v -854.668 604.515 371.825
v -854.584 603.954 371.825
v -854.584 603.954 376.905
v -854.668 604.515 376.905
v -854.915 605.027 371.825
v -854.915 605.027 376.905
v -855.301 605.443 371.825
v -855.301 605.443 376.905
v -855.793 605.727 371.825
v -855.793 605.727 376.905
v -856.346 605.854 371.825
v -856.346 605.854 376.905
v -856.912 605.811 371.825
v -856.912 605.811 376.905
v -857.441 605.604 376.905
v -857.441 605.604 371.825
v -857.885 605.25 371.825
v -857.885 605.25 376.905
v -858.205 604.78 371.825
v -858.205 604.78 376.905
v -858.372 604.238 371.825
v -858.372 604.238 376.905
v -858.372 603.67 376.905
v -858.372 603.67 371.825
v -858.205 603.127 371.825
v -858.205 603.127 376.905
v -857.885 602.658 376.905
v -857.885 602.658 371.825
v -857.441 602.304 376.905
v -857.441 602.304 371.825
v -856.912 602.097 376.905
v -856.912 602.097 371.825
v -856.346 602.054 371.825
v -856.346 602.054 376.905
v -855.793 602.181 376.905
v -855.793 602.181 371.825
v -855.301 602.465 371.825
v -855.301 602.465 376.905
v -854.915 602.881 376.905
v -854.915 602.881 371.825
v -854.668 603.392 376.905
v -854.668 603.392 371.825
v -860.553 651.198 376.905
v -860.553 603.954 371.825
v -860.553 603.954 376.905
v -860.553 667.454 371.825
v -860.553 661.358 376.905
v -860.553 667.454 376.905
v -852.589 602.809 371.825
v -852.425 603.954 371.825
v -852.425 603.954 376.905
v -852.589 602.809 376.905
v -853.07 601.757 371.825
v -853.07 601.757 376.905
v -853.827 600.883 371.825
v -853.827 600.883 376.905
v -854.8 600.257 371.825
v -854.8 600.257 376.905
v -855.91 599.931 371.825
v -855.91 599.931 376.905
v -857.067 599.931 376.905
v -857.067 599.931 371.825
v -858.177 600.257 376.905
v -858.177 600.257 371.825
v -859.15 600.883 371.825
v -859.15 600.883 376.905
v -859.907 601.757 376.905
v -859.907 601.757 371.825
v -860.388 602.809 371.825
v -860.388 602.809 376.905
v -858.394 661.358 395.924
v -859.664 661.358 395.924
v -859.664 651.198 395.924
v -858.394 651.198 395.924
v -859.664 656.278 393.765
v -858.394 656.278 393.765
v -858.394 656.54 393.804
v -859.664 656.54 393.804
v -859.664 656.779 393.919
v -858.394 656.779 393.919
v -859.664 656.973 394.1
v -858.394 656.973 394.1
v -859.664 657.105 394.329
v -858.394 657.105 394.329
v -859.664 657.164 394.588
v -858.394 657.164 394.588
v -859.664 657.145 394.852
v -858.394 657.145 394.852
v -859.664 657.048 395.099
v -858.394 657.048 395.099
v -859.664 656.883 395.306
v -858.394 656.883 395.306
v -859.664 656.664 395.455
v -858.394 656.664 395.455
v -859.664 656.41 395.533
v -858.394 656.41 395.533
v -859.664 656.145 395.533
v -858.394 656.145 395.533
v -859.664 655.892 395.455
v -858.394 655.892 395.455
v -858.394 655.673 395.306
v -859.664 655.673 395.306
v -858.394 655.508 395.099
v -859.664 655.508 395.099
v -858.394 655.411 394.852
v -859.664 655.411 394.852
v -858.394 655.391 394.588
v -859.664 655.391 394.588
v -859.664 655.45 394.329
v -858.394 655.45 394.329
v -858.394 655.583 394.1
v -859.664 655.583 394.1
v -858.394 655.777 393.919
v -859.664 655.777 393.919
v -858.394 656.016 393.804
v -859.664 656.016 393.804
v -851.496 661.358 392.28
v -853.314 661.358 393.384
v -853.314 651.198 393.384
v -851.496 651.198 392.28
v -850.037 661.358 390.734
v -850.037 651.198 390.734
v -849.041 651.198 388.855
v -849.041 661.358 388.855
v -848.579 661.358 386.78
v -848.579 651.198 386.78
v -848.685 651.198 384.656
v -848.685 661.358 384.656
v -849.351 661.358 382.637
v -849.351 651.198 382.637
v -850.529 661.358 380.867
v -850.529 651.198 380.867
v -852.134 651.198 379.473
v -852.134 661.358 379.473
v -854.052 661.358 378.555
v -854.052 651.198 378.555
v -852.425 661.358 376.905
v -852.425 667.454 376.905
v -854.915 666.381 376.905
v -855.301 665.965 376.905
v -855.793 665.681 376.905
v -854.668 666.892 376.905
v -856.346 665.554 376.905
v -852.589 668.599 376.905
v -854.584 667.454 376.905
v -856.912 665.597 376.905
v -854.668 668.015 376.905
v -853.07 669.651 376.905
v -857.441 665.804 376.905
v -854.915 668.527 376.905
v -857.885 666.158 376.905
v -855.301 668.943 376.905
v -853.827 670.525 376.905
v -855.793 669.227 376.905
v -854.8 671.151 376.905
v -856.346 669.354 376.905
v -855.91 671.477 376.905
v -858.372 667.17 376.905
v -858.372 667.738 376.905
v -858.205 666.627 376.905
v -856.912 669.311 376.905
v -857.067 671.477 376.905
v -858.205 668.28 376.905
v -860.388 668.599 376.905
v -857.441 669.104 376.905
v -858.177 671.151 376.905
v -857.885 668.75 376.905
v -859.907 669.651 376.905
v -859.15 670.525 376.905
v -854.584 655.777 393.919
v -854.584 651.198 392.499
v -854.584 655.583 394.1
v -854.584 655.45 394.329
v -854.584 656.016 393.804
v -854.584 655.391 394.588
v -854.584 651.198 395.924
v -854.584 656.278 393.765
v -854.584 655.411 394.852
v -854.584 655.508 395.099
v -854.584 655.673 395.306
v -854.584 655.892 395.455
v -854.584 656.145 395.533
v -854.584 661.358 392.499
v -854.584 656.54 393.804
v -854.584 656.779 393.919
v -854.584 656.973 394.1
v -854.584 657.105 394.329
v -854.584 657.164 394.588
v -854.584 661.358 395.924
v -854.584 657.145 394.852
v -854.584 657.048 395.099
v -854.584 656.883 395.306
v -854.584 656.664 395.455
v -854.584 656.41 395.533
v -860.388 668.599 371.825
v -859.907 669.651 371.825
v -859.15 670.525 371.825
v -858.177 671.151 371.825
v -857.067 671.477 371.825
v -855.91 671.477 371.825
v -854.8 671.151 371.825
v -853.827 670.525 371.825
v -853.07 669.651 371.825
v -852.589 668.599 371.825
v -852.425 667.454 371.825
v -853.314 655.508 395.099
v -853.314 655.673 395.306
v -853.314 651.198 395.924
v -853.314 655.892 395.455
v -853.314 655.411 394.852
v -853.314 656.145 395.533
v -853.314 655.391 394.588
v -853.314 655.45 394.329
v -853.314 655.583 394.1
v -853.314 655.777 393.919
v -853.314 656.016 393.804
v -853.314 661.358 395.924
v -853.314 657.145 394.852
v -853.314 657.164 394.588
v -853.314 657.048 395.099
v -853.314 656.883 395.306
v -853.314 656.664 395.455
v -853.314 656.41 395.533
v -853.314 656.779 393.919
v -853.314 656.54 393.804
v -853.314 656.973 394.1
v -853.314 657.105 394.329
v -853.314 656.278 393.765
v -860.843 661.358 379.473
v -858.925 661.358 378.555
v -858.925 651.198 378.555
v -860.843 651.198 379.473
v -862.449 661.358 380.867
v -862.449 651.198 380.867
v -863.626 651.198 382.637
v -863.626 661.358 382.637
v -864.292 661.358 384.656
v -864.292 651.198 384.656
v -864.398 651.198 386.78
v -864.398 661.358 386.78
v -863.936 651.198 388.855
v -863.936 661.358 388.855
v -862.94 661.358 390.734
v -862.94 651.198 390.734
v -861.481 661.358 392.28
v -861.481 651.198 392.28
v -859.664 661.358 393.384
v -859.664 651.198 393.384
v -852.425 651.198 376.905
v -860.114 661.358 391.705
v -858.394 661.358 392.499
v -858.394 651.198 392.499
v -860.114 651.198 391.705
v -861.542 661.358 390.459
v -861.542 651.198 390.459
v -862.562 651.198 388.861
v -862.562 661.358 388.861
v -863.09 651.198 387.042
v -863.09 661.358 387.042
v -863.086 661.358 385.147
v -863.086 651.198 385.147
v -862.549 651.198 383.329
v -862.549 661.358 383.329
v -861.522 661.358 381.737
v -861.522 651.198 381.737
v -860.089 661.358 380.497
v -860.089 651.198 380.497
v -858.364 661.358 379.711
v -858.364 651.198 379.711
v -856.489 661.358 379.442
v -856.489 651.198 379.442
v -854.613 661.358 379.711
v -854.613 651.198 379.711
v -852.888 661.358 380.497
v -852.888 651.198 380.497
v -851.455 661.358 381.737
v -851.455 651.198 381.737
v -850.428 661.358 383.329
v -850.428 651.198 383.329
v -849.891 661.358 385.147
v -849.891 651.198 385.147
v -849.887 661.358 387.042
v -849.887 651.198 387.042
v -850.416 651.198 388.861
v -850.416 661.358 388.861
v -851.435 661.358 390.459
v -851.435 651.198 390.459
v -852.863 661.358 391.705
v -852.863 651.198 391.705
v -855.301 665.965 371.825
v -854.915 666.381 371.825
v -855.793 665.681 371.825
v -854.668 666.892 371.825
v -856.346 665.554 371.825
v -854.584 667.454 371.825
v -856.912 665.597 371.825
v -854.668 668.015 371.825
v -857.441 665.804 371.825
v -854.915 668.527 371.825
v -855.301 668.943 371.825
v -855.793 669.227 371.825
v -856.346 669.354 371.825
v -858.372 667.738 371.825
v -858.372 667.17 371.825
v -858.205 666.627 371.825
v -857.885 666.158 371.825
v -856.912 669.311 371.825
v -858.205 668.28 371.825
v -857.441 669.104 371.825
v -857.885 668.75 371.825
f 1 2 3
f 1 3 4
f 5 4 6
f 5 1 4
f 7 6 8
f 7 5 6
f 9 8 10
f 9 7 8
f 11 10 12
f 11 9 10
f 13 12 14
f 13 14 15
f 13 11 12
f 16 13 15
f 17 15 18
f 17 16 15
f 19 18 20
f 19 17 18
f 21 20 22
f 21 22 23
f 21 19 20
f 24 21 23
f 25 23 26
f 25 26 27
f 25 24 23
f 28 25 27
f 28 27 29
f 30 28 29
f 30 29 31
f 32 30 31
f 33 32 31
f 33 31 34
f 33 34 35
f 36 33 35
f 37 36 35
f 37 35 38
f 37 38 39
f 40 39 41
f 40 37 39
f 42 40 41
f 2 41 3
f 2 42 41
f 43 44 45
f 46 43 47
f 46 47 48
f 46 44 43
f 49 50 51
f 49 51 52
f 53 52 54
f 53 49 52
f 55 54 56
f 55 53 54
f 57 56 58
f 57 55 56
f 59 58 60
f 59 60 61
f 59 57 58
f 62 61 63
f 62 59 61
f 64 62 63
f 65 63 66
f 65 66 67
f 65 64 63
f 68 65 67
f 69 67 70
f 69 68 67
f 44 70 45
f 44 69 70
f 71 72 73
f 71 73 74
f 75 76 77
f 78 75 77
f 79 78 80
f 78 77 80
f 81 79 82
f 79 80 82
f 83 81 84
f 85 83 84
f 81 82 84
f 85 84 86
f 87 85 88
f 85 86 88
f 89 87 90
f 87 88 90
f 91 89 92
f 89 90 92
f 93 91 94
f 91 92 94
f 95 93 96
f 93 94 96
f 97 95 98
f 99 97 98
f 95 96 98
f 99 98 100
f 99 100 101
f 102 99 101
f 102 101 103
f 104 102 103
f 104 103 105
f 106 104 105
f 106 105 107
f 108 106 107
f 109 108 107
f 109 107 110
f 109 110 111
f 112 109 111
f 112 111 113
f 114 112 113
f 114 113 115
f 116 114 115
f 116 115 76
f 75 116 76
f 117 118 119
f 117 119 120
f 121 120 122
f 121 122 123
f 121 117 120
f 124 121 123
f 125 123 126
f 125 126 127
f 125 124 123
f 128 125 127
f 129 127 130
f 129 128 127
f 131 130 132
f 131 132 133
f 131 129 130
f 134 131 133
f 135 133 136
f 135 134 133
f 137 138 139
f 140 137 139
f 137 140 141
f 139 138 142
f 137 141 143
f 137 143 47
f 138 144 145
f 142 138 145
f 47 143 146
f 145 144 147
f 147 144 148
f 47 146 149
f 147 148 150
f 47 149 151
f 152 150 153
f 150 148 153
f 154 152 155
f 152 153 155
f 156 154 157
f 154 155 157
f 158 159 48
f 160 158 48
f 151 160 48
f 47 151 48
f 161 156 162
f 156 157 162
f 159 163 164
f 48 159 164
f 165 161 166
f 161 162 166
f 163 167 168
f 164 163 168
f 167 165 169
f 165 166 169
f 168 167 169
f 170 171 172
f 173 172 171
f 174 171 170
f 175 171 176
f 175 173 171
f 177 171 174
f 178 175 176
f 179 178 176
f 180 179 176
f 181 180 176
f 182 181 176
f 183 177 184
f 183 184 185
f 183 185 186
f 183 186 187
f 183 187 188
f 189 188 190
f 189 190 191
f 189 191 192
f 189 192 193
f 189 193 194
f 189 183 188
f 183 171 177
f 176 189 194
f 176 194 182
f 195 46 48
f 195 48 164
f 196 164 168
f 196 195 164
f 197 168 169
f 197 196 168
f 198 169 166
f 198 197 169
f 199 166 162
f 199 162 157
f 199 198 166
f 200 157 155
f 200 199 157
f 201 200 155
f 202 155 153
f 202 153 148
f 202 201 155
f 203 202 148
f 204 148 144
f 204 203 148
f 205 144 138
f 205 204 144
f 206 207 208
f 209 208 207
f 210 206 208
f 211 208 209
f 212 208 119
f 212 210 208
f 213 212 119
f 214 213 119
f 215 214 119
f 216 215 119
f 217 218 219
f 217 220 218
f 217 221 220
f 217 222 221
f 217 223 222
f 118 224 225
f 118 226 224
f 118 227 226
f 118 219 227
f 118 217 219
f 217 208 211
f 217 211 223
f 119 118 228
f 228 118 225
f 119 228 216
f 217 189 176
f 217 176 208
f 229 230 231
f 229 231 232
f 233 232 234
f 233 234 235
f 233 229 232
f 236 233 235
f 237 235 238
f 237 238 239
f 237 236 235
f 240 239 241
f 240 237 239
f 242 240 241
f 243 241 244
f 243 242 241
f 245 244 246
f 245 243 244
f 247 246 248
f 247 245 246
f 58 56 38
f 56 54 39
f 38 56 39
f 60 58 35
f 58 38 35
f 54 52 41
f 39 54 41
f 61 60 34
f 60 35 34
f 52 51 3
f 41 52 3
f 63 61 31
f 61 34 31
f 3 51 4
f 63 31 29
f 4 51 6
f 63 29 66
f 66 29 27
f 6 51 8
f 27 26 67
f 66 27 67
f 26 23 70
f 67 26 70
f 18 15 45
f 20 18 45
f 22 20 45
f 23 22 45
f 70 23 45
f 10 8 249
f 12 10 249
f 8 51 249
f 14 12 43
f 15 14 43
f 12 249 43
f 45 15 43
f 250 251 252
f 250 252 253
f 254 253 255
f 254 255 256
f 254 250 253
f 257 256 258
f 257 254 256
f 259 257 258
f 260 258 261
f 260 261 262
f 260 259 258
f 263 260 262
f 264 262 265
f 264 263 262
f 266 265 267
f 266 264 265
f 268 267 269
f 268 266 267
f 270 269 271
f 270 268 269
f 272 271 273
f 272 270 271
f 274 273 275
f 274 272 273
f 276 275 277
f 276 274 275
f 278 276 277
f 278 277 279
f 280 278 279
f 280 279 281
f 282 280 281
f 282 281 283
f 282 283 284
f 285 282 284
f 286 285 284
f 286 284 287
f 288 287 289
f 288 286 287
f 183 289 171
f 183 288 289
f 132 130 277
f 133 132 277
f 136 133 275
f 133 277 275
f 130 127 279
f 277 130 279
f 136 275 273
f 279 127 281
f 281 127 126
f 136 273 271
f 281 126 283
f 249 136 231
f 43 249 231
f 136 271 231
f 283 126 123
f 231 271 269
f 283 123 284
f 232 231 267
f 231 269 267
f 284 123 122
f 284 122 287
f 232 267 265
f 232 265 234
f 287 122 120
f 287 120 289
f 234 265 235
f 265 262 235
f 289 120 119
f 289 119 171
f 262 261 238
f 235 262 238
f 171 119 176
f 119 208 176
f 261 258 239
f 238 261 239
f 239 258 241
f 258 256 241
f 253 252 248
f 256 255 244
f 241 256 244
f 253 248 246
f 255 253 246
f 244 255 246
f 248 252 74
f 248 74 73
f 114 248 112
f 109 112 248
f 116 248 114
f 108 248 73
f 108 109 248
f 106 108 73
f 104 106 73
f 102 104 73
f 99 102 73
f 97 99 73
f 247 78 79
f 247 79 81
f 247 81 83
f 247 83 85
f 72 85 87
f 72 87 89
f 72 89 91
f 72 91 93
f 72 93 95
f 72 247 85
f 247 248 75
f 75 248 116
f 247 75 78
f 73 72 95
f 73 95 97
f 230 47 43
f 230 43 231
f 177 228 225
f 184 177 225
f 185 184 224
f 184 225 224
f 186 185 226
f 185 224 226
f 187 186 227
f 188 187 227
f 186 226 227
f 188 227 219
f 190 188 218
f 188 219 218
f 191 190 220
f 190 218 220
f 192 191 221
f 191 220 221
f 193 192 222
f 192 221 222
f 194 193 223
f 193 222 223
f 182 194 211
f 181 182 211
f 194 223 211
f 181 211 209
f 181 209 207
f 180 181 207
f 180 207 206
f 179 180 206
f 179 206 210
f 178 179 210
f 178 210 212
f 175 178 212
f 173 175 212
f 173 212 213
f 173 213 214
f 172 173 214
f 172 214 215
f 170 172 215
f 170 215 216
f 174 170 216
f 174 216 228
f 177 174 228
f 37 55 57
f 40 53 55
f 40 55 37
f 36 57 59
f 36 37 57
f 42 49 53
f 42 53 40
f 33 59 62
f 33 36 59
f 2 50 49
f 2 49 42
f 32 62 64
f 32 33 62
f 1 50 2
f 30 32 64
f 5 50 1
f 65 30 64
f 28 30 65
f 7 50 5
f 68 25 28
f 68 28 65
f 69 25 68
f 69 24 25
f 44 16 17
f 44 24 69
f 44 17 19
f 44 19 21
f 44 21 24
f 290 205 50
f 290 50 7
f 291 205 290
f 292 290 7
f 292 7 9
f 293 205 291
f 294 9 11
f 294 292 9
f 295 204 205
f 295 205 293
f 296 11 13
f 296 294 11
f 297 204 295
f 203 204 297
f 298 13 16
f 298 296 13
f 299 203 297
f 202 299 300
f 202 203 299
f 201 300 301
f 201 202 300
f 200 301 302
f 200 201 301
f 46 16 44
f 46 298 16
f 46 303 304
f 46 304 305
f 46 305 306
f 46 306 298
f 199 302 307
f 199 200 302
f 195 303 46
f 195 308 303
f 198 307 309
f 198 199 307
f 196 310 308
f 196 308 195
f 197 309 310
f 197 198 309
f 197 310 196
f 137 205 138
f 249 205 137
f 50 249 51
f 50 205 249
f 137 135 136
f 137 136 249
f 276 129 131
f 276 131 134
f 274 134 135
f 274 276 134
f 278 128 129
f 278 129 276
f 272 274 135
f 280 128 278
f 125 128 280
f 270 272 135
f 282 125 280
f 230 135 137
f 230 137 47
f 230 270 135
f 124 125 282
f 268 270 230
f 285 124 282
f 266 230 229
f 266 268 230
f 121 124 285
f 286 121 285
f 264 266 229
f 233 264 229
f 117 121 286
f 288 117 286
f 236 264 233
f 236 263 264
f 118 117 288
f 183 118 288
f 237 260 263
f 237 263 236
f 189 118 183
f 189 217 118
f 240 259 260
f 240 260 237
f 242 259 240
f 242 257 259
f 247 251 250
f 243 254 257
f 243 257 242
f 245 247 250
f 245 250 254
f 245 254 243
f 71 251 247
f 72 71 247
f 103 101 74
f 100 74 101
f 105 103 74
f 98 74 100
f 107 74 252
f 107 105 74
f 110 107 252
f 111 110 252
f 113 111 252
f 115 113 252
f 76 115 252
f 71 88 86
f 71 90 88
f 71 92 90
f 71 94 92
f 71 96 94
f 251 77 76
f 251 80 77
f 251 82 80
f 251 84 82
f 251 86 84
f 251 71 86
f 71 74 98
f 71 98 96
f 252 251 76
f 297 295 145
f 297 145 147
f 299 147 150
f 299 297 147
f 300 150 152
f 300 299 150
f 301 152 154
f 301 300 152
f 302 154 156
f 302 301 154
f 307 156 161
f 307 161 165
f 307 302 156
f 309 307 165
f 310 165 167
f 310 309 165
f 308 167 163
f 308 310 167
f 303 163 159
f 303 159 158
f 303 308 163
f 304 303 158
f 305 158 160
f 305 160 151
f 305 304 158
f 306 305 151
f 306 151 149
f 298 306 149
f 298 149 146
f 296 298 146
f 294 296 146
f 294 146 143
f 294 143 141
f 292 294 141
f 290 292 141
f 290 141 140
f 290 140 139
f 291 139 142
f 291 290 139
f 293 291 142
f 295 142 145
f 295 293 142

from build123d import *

# Parameters (mm, degrees)
SKETCH1_R           = 1.905
BOSS_EXTRUDE1_DEPTH = 5.08
BOSS_EXTRUDE2_START = 10.16
BOSS_EXTRUDE2_DEPTH = 10.16
SKETCH3_R           = 0.889
CUT_EXTRUDE1_DEPTH  = 12.1125


with BuildPart() as part:
    # Sketch1 → Boss-Extrude1 (new body)
    with BuildSketch(Plane(origin=(-856.488519717, 635.703940982, 371.824950285), x_dir=(1, 0, 0), z_dir=(0, 0, 1))):
        with BuildLine():
            Line((4.064, 31.75), (4.064, -31.75))
            ThreePointArc((4.064, -31.75), (0, -35.814), (-4.064, -31.75))
            Line((-4.064, -31.75), (-4.064, 31.75))
            ThreePointArc((-4.064, 31.75), (0, 35.814), (4.064, 31.75))
        make_face()
        with Locations((0, -31.75)):
            Circle(SKETCH1_R, mode=Mode.SUBTRACT)
        with Locations((0, 31.75)):
            Circle(SKETCH1_R, mode=Mode.SUBTRACT)
    extrude(amount=BOSS_EXTRUDE1_DEPTH)

    # Sketch2 → Boss-Extrude2 (add)
    with BuildSketch(Plane.XZ.offset(-671.517940982).offset(BOSS_EXTRUDE2_START)):
        with BuildLine():
            Line((-854.05175925, 378.554950285), (-852.424519717, 376.904950285))
            Line((-852.424519717, 376.904950285), (-860.552519717, 376.904950285))
            Line((-860.552519717, 376.904950285), (-858.925280183, 378.554950285))
            ThreePointArc((-858.925280183, 378.554950285), (-864.416201891, 385.714494899), (-859.663519717, 393.384000256))
            Line((-859.663519717, 393.384000256), (-859.663519717, 395.924000256))
            Line((-859.663519717, 395.924000256), (-858.393519717, 395.924000256))
            Line((-858.393519717, 395.924000256), (-858.393519717, 393.814671139))
            Line((-858.393519717, 393.814671139), (-858.393519717, 392.498725586))
            ThreePointArc((-858.393519717, 392.498725586), (-856.488519717, 379.441661341), (-854.583519717, 392.498725586))
            Line((-854.583519717, 392.498725586), (-854.583519717, 393.814671139))
            Line((-854.583519717, 393.814671139), (-854.583519717, 395.924000256))
            Line((-854.583519717, 395.924000256), (-853.313519717, 395.924000256))
            Line((-853.313519717, 395.924000256), (-853.313519717, 393.384000256))
            ThreePointArc((-853.313519717, 393.384000256), (-848.560837543, 385.714494899), (-854.05175925, 378.554950285))
        make_face()
    extrude(amount=BOSS_EXTRUDE2_DEPTH)

    # Sketch3 → Cut-Extrude1 (cut, through all)
    with BuildSketch(Plane(origin=(-853.313519717, 0, 0), x_dir=(0, 0, -1), z_dir=(1, 0, 0))):
        with Locations((-394.654000256, 656.277940982)):
            Circle(SKETCH3_R)
    extrude(amount=-CUT_EXTRUDE1_DEPTH, mode=Mode.SUBTRACT)


solid = part.part
